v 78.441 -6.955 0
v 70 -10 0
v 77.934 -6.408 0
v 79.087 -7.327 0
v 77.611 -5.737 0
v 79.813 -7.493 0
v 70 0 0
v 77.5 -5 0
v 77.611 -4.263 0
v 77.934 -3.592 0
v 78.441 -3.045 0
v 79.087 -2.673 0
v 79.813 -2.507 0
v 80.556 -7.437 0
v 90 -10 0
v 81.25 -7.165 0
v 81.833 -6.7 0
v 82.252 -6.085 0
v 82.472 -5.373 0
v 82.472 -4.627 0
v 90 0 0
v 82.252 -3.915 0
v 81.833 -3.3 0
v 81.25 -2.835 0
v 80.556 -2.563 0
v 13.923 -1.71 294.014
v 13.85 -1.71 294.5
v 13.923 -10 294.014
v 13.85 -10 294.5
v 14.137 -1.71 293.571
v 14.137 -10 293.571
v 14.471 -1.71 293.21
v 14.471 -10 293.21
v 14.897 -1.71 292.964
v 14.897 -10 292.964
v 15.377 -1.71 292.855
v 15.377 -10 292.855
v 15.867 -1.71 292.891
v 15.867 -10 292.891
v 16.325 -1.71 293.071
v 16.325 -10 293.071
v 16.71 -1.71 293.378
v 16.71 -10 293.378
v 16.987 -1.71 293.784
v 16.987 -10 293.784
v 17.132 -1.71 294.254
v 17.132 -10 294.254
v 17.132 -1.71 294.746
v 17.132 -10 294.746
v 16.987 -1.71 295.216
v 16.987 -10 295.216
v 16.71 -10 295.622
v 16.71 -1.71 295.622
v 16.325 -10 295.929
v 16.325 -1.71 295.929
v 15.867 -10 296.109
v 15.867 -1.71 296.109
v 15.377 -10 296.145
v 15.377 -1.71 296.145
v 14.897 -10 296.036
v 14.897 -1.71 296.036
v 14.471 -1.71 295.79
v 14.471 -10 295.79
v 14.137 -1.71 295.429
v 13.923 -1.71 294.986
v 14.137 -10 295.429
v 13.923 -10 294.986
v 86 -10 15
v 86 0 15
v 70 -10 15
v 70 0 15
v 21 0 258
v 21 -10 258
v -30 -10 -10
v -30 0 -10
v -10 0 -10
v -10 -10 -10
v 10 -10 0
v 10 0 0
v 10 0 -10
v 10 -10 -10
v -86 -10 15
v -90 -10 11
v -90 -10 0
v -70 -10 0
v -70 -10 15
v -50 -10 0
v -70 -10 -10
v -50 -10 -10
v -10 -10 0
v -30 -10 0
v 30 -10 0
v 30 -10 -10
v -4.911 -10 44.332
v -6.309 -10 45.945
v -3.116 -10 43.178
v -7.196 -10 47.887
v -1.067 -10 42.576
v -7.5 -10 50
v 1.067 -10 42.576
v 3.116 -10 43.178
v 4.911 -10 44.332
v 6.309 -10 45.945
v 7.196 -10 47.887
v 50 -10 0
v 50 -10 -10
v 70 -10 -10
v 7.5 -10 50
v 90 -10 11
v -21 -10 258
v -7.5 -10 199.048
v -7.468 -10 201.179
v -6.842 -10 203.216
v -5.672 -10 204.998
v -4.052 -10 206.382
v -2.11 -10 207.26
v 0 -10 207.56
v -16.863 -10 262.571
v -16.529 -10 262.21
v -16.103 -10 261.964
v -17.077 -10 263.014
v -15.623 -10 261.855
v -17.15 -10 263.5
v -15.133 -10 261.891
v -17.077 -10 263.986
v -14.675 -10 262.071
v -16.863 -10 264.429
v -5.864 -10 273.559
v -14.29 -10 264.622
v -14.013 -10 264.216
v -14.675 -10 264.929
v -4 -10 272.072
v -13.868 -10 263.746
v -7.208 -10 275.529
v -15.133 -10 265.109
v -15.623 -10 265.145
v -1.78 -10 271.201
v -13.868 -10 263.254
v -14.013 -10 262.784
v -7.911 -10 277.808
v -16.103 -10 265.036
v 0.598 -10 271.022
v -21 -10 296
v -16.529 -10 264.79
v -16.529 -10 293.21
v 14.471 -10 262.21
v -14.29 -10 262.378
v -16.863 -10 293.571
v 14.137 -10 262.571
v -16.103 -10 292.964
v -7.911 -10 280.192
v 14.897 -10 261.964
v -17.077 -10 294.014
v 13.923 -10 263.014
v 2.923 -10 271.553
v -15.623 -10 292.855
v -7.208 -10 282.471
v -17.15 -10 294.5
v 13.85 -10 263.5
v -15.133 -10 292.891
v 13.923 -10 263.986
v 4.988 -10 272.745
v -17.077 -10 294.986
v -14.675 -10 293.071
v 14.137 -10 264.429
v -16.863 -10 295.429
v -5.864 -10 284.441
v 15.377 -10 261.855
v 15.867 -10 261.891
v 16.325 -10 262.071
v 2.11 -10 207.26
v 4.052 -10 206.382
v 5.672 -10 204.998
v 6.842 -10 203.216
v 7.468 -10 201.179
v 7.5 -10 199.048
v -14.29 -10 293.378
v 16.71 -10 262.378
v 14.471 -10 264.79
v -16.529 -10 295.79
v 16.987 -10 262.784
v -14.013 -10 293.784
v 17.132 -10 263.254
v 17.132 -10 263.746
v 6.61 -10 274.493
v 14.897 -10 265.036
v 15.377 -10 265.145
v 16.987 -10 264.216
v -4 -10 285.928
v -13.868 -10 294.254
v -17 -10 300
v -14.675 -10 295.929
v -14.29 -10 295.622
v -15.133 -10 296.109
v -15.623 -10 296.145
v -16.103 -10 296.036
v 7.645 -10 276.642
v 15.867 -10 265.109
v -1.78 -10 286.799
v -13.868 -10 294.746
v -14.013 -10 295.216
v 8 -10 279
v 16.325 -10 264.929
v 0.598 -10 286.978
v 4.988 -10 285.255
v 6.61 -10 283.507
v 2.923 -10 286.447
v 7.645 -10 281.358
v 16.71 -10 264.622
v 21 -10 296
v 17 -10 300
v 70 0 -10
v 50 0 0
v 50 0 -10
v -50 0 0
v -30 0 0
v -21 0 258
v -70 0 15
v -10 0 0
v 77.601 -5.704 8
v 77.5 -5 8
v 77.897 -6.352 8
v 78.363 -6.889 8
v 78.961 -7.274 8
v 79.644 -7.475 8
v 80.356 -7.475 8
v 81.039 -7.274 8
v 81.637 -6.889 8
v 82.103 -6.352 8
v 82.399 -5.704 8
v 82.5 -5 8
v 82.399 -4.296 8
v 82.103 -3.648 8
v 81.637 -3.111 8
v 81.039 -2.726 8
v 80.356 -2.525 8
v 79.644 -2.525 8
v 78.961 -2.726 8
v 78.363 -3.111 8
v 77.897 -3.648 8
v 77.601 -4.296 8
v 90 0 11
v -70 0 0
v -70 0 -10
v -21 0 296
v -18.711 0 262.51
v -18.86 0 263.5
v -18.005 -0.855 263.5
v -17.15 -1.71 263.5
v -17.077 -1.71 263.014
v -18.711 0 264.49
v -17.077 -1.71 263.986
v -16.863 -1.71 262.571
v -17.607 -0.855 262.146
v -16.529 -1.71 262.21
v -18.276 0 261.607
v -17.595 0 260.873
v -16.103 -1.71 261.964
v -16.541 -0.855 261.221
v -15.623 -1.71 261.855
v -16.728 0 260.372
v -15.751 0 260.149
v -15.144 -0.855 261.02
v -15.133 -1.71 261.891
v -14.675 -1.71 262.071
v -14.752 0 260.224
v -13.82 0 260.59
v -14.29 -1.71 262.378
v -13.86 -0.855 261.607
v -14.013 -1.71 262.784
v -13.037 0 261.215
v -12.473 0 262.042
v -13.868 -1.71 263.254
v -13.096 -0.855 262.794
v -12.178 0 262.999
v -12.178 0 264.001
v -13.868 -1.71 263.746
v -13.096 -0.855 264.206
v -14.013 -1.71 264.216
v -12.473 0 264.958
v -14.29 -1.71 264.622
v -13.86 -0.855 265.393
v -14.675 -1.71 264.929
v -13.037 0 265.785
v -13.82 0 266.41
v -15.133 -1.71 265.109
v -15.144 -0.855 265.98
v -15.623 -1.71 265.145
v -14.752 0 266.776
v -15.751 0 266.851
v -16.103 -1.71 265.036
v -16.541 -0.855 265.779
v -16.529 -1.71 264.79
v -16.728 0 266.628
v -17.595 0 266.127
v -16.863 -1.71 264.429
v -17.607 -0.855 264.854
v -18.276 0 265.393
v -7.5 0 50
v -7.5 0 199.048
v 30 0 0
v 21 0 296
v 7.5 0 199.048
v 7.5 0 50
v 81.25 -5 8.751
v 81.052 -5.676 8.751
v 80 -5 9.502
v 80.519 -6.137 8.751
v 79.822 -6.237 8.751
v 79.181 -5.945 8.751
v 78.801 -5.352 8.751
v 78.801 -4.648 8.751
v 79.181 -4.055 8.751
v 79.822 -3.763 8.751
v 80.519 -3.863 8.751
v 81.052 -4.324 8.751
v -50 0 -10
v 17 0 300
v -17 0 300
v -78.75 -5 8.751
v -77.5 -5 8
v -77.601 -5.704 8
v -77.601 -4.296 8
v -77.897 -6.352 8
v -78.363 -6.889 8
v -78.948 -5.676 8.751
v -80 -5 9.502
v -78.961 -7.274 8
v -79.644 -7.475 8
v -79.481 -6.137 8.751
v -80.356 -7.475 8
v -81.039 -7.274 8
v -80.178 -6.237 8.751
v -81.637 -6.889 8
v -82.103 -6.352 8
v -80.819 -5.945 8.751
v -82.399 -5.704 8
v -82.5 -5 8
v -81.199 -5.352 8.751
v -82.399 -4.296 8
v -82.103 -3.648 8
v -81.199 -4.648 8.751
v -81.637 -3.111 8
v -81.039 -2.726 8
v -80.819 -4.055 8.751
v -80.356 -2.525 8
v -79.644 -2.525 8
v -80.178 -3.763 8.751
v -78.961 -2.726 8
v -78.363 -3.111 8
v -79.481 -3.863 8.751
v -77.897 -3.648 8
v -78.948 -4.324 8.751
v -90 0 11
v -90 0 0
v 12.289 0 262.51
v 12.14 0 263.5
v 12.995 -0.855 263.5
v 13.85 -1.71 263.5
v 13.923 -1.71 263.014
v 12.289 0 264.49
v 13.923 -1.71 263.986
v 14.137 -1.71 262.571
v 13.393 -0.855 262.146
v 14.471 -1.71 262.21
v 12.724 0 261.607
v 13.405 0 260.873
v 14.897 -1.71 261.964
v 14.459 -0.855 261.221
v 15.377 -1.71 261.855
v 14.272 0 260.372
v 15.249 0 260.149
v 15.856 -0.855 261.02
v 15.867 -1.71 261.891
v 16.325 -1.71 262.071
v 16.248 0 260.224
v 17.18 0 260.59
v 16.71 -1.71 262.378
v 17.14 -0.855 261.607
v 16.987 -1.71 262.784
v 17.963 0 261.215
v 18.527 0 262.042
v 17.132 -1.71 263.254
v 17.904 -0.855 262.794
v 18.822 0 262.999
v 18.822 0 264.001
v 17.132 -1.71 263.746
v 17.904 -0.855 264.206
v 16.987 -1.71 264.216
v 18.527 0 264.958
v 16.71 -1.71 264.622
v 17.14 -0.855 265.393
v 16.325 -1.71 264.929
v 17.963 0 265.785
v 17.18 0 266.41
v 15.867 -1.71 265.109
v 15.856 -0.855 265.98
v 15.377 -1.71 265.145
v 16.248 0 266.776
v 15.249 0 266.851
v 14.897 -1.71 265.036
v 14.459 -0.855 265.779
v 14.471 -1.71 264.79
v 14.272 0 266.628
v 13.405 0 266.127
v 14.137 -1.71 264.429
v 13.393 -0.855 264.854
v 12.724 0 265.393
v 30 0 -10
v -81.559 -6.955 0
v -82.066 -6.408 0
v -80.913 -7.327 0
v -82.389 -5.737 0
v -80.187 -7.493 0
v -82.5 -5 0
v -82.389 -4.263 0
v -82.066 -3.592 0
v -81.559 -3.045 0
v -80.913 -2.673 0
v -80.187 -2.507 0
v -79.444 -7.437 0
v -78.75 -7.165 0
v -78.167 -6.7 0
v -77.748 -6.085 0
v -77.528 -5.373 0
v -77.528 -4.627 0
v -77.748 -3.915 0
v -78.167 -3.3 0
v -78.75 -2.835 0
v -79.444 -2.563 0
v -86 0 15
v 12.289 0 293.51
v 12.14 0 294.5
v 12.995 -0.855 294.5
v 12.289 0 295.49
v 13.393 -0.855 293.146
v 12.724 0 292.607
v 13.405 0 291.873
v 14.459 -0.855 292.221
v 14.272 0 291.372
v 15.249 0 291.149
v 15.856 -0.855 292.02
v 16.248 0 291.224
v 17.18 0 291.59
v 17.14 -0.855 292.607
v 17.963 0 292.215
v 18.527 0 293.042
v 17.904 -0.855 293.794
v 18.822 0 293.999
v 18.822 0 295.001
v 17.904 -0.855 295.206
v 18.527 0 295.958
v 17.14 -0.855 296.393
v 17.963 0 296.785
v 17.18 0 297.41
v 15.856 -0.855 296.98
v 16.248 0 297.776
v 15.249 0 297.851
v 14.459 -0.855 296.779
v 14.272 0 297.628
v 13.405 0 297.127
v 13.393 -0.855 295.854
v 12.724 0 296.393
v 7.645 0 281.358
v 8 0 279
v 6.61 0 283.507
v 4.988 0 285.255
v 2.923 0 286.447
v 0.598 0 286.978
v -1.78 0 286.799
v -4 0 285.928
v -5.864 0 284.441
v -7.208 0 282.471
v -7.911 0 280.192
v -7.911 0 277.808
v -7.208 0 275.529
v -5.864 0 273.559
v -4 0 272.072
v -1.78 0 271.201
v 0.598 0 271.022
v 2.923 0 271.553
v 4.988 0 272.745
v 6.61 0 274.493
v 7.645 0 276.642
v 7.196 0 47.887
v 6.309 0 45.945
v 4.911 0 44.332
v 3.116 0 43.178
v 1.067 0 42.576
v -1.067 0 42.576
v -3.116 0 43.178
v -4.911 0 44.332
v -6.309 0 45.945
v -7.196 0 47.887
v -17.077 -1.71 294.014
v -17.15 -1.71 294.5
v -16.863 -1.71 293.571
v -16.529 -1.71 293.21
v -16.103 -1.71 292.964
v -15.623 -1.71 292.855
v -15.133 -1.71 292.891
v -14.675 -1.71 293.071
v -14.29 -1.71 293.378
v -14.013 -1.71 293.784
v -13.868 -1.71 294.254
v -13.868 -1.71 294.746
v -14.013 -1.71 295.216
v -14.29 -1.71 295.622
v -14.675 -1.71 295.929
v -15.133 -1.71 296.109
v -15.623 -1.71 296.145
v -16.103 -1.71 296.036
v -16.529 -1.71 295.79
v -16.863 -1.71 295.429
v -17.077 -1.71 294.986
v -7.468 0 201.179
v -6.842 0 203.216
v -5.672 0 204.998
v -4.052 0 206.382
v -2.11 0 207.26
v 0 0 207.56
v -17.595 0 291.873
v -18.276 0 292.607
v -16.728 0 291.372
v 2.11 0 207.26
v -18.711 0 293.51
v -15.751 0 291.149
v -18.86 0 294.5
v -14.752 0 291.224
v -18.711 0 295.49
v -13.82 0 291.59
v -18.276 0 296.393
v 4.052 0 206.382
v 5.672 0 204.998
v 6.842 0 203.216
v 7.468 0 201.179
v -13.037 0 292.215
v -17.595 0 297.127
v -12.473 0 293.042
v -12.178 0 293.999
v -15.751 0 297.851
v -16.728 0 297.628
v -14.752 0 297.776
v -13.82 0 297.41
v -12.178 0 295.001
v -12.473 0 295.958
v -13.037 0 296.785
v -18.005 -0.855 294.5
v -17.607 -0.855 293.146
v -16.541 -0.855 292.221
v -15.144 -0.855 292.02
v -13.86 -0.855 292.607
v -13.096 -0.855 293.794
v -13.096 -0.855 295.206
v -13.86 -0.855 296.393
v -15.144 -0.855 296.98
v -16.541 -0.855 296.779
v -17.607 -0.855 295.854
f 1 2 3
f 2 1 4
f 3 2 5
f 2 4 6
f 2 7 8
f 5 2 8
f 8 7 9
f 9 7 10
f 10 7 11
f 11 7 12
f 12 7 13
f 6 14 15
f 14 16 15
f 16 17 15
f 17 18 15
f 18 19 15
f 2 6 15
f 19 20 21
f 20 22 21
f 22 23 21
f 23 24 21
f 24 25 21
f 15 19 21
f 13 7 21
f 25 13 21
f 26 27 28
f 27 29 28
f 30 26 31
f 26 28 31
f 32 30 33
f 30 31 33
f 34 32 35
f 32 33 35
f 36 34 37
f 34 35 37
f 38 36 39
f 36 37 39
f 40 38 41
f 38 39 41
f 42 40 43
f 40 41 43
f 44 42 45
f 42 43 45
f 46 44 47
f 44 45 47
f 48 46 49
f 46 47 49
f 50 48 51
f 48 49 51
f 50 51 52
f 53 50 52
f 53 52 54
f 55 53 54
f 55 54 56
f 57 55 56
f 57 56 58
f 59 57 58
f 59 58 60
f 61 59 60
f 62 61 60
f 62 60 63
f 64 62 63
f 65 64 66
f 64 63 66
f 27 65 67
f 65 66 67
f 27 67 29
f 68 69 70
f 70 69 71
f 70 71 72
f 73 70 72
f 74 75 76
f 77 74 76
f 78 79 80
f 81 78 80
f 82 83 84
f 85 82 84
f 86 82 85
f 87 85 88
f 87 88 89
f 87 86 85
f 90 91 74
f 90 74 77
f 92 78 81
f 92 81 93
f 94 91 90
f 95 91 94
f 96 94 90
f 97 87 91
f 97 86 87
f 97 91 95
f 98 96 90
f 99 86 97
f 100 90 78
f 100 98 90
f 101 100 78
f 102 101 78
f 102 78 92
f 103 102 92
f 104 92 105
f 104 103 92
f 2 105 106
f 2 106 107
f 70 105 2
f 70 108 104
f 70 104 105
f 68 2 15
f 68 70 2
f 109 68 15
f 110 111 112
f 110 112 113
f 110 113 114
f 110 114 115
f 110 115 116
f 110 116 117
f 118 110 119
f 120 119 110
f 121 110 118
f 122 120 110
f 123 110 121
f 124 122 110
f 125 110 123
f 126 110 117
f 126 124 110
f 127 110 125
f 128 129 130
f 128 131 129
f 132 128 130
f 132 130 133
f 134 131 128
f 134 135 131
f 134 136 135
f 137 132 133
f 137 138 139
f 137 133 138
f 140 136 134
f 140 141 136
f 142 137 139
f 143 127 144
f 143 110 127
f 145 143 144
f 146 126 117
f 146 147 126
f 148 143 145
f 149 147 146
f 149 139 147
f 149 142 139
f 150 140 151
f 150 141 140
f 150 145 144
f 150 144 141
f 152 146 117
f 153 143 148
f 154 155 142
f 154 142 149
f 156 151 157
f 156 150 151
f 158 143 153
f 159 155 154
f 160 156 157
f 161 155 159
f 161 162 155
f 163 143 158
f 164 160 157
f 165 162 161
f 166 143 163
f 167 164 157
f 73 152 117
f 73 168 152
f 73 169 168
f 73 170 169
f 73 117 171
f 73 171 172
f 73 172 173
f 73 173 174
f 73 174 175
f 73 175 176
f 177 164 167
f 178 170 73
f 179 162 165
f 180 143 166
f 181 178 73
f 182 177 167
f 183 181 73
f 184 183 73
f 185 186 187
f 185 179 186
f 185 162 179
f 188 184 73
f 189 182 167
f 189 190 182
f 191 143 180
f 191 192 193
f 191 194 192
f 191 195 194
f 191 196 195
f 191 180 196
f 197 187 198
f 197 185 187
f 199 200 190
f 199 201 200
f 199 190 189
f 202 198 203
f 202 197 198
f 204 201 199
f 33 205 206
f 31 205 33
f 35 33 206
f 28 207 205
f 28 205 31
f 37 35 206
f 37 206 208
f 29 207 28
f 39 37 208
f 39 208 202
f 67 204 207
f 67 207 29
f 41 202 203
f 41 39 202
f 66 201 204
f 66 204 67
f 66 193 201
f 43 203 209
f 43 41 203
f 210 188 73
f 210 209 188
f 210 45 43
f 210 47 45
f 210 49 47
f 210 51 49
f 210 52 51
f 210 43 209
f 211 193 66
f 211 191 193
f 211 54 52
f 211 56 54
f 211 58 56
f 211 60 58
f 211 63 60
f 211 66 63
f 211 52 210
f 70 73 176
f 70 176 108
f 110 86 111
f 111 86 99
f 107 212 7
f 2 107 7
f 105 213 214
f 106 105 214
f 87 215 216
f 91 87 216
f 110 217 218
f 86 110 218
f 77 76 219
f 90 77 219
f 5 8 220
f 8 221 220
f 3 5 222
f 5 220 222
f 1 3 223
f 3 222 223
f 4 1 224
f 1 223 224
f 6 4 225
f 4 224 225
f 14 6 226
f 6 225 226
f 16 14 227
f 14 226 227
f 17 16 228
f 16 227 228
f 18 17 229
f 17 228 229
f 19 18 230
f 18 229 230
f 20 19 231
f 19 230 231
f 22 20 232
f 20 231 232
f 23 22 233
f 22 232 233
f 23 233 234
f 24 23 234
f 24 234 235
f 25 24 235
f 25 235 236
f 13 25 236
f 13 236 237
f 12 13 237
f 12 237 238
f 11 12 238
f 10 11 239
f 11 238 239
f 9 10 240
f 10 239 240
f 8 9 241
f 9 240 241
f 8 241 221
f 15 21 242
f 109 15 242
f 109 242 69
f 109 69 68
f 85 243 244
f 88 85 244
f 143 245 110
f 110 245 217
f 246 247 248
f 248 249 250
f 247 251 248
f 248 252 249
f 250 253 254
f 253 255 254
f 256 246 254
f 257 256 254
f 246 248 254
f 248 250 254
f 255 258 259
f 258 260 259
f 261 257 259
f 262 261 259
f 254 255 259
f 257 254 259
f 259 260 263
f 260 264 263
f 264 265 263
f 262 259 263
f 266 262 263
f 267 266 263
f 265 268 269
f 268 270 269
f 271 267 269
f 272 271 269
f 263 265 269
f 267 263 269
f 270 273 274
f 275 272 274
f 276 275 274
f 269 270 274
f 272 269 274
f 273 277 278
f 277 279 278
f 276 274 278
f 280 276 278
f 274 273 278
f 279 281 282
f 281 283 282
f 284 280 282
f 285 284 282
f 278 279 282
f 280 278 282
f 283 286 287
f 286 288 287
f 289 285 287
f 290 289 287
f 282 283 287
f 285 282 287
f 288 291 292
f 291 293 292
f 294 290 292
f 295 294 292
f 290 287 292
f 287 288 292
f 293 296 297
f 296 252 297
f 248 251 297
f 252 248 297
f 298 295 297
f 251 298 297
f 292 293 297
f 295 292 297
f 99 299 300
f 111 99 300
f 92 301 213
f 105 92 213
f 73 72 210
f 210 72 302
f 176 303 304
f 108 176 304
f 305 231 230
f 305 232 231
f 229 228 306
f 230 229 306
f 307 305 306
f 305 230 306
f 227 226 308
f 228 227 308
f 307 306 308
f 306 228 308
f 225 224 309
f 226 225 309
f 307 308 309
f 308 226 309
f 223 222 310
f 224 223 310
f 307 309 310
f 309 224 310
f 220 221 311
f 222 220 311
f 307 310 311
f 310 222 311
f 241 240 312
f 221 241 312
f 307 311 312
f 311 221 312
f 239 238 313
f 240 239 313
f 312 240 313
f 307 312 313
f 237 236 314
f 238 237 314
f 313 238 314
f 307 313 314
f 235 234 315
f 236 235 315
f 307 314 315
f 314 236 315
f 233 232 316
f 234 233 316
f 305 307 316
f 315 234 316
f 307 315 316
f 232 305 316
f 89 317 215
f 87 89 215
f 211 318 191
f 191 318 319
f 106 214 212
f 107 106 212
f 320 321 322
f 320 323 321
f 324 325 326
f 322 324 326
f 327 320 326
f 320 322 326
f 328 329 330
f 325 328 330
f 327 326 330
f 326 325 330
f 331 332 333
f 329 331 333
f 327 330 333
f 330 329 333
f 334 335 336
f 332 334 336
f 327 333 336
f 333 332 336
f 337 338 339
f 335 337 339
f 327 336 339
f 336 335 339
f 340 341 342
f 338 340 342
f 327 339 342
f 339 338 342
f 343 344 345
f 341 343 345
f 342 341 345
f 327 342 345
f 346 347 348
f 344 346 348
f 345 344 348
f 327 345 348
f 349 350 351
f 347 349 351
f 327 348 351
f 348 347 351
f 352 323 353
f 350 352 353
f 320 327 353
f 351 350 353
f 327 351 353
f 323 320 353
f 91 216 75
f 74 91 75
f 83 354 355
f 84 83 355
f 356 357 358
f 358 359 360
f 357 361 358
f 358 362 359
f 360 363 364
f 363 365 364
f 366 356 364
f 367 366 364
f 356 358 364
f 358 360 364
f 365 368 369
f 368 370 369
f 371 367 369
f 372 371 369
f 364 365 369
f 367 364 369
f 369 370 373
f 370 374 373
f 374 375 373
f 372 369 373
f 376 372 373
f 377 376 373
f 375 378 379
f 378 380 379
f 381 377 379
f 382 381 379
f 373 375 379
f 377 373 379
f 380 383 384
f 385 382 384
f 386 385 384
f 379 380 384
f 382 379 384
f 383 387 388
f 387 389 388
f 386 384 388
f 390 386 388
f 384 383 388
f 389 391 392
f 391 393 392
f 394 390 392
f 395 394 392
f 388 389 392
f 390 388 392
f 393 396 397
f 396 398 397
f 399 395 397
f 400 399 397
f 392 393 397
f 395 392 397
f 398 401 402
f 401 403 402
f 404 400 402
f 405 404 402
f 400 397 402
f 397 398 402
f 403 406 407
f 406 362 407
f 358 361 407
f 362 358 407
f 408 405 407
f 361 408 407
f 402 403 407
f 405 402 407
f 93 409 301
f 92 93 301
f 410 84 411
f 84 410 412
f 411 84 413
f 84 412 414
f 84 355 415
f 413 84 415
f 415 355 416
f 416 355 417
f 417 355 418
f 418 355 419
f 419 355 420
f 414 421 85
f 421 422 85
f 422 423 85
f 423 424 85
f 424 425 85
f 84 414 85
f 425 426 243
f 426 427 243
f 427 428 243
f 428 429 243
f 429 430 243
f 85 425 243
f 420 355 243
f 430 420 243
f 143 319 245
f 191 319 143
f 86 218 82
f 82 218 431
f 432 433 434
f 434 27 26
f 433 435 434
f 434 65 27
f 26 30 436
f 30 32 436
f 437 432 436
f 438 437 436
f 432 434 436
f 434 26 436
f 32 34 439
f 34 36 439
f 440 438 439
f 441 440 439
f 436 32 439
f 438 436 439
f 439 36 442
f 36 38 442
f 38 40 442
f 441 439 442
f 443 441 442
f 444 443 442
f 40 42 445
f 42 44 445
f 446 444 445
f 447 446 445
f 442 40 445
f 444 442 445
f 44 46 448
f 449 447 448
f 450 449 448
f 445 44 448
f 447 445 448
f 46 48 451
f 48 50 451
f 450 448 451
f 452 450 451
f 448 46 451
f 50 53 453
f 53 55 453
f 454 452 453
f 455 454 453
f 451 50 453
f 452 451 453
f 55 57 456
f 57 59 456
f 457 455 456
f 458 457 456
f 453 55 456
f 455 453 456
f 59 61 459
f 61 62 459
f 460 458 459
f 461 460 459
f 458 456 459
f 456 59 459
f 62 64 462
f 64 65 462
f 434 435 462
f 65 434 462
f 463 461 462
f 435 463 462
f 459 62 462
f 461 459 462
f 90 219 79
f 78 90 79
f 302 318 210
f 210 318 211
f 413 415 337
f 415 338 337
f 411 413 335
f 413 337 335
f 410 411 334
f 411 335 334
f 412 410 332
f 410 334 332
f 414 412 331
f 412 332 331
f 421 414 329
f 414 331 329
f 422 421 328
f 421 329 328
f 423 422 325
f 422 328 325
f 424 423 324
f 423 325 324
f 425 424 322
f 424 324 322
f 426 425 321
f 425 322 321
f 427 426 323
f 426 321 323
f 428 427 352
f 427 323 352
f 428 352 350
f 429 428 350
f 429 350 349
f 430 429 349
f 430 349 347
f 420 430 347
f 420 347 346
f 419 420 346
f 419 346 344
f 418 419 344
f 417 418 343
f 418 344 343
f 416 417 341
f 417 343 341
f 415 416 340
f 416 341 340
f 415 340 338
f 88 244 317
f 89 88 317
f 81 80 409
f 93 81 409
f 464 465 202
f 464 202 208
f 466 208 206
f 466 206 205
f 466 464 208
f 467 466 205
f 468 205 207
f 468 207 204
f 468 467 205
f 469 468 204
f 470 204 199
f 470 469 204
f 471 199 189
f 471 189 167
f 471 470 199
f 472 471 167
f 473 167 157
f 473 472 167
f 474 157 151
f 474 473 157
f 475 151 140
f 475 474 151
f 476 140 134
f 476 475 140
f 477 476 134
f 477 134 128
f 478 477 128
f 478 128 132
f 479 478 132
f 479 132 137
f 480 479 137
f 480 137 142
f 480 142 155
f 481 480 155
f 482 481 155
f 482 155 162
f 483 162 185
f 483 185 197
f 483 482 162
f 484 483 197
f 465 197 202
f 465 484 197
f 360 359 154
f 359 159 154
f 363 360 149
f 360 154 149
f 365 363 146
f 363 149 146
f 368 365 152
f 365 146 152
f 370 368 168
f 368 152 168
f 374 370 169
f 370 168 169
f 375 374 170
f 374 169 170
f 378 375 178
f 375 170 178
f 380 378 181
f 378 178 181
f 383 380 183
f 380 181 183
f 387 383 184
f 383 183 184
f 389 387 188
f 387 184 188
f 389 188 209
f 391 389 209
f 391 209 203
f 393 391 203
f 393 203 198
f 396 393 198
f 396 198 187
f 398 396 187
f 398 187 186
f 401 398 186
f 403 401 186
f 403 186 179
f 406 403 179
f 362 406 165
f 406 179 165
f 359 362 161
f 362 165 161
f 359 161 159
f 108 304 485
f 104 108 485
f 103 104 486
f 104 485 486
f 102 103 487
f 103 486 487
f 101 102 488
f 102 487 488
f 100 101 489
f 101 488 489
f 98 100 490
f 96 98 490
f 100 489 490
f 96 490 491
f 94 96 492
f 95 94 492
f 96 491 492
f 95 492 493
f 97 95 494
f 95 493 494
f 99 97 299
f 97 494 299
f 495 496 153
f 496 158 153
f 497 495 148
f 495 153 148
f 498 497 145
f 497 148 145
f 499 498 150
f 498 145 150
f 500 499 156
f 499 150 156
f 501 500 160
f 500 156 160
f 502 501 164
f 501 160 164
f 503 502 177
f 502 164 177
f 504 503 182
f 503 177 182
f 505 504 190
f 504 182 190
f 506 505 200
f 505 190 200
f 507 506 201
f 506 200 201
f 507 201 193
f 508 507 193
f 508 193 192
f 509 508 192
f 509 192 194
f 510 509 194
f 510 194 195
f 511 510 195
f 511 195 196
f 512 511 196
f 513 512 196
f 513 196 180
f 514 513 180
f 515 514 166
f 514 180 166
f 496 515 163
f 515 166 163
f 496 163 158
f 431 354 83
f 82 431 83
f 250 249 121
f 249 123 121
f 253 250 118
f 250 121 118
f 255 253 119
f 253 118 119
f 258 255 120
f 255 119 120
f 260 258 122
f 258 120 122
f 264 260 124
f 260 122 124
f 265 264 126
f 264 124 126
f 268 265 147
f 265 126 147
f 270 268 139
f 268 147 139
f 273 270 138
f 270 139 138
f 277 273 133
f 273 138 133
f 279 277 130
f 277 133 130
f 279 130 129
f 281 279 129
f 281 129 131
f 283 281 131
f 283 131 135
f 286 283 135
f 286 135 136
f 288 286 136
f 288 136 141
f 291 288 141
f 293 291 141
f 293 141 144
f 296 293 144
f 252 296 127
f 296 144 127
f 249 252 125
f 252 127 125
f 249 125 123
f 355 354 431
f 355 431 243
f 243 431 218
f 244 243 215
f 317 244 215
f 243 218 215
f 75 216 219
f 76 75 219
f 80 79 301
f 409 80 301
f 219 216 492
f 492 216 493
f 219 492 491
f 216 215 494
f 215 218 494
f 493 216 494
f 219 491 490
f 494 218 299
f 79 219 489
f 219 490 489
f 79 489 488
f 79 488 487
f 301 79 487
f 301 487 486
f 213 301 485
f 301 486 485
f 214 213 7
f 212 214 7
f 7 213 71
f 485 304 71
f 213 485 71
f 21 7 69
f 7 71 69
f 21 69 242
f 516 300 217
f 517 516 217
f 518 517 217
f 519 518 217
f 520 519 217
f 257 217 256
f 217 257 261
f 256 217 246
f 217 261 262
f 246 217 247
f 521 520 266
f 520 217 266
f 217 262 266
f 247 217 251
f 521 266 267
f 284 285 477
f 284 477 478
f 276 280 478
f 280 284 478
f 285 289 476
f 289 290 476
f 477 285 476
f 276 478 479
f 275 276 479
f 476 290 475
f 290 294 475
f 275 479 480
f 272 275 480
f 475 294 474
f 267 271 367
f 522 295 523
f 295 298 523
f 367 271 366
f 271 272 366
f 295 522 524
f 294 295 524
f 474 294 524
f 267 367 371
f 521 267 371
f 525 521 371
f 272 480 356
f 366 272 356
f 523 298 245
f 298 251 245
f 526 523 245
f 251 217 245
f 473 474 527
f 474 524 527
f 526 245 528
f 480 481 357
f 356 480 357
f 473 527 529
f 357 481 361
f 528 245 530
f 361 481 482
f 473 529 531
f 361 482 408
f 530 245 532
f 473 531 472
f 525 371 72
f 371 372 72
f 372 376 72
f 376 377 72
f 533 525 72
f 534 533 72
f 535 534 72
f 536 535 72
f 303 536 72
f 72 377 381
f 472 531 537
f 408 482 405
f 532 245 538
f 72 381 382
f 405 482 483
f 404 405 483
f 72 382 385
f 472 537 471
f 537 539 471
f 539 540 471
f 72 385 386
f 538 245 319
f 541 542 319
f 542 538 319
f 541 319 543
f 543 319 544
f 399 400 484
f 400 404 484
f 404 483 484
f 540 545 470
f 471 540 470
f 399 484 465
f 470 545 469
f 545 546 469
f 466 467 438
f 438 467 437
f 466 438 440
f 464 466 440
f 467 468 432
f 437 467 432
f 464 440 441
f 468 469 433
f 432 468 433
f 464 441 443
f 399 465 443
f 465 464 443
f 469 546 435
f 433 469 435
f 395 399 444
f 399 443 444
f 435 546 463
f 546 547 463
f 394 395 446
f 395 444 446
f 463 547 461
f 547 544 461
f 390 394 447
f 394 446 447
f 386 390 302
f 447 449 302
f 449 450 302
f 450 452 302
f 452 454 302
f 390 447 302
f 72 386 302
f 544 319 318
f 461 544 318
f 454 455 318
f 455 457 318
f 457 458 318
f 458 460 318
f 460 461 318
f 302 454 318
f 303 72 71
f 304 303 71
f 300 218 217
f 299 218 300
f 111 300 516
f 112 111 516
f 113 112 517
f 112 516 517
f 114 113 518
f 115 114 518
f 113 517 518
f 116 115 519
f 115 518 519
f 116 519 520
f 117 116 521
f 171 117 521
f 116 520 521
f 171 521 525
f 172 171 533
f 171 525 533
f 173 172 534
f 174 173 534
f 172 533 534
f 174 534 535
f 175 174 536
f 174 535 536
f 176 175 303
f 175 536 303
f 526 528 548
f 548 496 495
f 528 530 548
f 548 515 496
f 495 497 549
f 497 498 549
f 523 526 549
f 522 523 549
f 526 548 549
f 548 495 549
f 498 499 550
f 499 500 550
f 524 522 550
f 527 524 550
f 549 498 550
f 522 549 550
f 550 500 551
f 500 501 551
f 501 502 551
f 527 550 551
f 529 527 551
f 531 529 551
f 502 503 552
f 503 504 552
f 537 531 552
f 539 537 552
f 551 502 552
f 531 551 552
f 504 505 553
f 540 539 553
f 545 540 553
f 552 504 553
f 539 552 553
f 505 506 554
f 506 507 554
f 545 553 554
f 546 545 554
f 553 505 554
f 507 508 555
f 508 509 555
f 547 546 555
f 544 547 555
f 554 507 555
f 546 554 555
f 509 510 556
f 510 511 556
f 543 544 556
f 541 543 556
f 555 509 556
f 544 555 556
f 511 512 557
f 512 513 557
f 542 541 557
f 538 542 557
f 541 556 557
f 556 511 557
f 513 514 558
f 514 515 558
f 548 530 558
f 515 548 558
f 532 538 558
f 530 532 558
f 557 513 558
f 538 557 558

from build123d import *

# Parameters (mm, degrees)
F0_R           = 8
F1_DEPTH       = 10
F2_SIZE        = 4
F3_SIZE        = 4
F4_D           = 3.3
F4_CSINK_D     = 6.72
F4_CSINK_ANGLE = 90
F6_D           = 5
F6_DEPTH       = 8
F6_TIP         = 1.5021515476


with BuildPart() as f1:
    # F0 (on Front) → F1 (new body)
    with BuildSketch(Plane.XZ):
        Polygon((-10, 0), (0, 0), (10, 0), (10, -10), (30, -10), (30, 0), (50, 0), (50, -10), (70, -10), (70, 0), (90, 0), (90, 15), (70, 15), (21, 258), (21, 300), (0, 300), (-21, 300), (-21, 258), (-70, 15), (-90, 15), (-90, 0), (-70, 0), (-70, -10), (-50, -10), (-50, 0), (-30, 0), (-30, -10), (-10, -10), align=None)
        with BuildLine():
            ThreePointArc((7.5, 50), (0, 42.5), (-7.5, 50))
            Line((-7.5, 50), (-7.5, 199.0483840028))
            ThreePointArc((-7.5, 199.0483840028), (0, 207.5601304887), (7.5, 199.0483840028))
            Line((7.5, 199.0483840028), (7.5, 50))
        make_face(mode=Mode.SUBTRACT)
        with Locations((0, 279)):
            Circle(F0_R, mode=Mode.SUBTRACT)
    extrude(amount=F1_DEPTH)

    # F2
    f2_edges = [f1.edges().sort_by_distance(p)[0] for p in [
        (21, -5, 300),
        (-21, -5, 300),
    ]]
    chamfer(f2_edges, length=F2_SIZE)

    # F3
    f3_edges = [f1.edges().sort_by_distance(p)[0] for p in [
        (-90, -5, 15),
        (90, -5, 15),
    ]]
    chamfer(f3_edges, length=F3_SIZE)

    # F4 (through all)
    with Locations(Plane(origin=(0, 0, 0), x_dir=(1, 0, 0), z_dir=(0, 1, 0))):
        with Locations((-15.5, -294.5), (15.5, -294.5), (15.5, -263.5), (-15.5, -263.5)):
            CounterSinkHole(F4_D / 2, F4_CSINK_D / 2, counter_sink_angle=F4_CSINK_ANGLE)

    # F6
    with Locations(Plane(origin=(0, 0, 0), x_dir=(1, 0, 0), z_dir=(0, 0, -1))):
        with Locations((-80, 5), (80, 5)):
            Hole(F6_D / 2, depth=F6_DEPTH)
            with Locations((0, 0, -(F6_DEPTH + F6_TIP / 2))):  # 118° drill point
                Cone(0, F6_D / 2, F6_TIP, mode=Mode.SUBTRACT)


solid = f1.part
